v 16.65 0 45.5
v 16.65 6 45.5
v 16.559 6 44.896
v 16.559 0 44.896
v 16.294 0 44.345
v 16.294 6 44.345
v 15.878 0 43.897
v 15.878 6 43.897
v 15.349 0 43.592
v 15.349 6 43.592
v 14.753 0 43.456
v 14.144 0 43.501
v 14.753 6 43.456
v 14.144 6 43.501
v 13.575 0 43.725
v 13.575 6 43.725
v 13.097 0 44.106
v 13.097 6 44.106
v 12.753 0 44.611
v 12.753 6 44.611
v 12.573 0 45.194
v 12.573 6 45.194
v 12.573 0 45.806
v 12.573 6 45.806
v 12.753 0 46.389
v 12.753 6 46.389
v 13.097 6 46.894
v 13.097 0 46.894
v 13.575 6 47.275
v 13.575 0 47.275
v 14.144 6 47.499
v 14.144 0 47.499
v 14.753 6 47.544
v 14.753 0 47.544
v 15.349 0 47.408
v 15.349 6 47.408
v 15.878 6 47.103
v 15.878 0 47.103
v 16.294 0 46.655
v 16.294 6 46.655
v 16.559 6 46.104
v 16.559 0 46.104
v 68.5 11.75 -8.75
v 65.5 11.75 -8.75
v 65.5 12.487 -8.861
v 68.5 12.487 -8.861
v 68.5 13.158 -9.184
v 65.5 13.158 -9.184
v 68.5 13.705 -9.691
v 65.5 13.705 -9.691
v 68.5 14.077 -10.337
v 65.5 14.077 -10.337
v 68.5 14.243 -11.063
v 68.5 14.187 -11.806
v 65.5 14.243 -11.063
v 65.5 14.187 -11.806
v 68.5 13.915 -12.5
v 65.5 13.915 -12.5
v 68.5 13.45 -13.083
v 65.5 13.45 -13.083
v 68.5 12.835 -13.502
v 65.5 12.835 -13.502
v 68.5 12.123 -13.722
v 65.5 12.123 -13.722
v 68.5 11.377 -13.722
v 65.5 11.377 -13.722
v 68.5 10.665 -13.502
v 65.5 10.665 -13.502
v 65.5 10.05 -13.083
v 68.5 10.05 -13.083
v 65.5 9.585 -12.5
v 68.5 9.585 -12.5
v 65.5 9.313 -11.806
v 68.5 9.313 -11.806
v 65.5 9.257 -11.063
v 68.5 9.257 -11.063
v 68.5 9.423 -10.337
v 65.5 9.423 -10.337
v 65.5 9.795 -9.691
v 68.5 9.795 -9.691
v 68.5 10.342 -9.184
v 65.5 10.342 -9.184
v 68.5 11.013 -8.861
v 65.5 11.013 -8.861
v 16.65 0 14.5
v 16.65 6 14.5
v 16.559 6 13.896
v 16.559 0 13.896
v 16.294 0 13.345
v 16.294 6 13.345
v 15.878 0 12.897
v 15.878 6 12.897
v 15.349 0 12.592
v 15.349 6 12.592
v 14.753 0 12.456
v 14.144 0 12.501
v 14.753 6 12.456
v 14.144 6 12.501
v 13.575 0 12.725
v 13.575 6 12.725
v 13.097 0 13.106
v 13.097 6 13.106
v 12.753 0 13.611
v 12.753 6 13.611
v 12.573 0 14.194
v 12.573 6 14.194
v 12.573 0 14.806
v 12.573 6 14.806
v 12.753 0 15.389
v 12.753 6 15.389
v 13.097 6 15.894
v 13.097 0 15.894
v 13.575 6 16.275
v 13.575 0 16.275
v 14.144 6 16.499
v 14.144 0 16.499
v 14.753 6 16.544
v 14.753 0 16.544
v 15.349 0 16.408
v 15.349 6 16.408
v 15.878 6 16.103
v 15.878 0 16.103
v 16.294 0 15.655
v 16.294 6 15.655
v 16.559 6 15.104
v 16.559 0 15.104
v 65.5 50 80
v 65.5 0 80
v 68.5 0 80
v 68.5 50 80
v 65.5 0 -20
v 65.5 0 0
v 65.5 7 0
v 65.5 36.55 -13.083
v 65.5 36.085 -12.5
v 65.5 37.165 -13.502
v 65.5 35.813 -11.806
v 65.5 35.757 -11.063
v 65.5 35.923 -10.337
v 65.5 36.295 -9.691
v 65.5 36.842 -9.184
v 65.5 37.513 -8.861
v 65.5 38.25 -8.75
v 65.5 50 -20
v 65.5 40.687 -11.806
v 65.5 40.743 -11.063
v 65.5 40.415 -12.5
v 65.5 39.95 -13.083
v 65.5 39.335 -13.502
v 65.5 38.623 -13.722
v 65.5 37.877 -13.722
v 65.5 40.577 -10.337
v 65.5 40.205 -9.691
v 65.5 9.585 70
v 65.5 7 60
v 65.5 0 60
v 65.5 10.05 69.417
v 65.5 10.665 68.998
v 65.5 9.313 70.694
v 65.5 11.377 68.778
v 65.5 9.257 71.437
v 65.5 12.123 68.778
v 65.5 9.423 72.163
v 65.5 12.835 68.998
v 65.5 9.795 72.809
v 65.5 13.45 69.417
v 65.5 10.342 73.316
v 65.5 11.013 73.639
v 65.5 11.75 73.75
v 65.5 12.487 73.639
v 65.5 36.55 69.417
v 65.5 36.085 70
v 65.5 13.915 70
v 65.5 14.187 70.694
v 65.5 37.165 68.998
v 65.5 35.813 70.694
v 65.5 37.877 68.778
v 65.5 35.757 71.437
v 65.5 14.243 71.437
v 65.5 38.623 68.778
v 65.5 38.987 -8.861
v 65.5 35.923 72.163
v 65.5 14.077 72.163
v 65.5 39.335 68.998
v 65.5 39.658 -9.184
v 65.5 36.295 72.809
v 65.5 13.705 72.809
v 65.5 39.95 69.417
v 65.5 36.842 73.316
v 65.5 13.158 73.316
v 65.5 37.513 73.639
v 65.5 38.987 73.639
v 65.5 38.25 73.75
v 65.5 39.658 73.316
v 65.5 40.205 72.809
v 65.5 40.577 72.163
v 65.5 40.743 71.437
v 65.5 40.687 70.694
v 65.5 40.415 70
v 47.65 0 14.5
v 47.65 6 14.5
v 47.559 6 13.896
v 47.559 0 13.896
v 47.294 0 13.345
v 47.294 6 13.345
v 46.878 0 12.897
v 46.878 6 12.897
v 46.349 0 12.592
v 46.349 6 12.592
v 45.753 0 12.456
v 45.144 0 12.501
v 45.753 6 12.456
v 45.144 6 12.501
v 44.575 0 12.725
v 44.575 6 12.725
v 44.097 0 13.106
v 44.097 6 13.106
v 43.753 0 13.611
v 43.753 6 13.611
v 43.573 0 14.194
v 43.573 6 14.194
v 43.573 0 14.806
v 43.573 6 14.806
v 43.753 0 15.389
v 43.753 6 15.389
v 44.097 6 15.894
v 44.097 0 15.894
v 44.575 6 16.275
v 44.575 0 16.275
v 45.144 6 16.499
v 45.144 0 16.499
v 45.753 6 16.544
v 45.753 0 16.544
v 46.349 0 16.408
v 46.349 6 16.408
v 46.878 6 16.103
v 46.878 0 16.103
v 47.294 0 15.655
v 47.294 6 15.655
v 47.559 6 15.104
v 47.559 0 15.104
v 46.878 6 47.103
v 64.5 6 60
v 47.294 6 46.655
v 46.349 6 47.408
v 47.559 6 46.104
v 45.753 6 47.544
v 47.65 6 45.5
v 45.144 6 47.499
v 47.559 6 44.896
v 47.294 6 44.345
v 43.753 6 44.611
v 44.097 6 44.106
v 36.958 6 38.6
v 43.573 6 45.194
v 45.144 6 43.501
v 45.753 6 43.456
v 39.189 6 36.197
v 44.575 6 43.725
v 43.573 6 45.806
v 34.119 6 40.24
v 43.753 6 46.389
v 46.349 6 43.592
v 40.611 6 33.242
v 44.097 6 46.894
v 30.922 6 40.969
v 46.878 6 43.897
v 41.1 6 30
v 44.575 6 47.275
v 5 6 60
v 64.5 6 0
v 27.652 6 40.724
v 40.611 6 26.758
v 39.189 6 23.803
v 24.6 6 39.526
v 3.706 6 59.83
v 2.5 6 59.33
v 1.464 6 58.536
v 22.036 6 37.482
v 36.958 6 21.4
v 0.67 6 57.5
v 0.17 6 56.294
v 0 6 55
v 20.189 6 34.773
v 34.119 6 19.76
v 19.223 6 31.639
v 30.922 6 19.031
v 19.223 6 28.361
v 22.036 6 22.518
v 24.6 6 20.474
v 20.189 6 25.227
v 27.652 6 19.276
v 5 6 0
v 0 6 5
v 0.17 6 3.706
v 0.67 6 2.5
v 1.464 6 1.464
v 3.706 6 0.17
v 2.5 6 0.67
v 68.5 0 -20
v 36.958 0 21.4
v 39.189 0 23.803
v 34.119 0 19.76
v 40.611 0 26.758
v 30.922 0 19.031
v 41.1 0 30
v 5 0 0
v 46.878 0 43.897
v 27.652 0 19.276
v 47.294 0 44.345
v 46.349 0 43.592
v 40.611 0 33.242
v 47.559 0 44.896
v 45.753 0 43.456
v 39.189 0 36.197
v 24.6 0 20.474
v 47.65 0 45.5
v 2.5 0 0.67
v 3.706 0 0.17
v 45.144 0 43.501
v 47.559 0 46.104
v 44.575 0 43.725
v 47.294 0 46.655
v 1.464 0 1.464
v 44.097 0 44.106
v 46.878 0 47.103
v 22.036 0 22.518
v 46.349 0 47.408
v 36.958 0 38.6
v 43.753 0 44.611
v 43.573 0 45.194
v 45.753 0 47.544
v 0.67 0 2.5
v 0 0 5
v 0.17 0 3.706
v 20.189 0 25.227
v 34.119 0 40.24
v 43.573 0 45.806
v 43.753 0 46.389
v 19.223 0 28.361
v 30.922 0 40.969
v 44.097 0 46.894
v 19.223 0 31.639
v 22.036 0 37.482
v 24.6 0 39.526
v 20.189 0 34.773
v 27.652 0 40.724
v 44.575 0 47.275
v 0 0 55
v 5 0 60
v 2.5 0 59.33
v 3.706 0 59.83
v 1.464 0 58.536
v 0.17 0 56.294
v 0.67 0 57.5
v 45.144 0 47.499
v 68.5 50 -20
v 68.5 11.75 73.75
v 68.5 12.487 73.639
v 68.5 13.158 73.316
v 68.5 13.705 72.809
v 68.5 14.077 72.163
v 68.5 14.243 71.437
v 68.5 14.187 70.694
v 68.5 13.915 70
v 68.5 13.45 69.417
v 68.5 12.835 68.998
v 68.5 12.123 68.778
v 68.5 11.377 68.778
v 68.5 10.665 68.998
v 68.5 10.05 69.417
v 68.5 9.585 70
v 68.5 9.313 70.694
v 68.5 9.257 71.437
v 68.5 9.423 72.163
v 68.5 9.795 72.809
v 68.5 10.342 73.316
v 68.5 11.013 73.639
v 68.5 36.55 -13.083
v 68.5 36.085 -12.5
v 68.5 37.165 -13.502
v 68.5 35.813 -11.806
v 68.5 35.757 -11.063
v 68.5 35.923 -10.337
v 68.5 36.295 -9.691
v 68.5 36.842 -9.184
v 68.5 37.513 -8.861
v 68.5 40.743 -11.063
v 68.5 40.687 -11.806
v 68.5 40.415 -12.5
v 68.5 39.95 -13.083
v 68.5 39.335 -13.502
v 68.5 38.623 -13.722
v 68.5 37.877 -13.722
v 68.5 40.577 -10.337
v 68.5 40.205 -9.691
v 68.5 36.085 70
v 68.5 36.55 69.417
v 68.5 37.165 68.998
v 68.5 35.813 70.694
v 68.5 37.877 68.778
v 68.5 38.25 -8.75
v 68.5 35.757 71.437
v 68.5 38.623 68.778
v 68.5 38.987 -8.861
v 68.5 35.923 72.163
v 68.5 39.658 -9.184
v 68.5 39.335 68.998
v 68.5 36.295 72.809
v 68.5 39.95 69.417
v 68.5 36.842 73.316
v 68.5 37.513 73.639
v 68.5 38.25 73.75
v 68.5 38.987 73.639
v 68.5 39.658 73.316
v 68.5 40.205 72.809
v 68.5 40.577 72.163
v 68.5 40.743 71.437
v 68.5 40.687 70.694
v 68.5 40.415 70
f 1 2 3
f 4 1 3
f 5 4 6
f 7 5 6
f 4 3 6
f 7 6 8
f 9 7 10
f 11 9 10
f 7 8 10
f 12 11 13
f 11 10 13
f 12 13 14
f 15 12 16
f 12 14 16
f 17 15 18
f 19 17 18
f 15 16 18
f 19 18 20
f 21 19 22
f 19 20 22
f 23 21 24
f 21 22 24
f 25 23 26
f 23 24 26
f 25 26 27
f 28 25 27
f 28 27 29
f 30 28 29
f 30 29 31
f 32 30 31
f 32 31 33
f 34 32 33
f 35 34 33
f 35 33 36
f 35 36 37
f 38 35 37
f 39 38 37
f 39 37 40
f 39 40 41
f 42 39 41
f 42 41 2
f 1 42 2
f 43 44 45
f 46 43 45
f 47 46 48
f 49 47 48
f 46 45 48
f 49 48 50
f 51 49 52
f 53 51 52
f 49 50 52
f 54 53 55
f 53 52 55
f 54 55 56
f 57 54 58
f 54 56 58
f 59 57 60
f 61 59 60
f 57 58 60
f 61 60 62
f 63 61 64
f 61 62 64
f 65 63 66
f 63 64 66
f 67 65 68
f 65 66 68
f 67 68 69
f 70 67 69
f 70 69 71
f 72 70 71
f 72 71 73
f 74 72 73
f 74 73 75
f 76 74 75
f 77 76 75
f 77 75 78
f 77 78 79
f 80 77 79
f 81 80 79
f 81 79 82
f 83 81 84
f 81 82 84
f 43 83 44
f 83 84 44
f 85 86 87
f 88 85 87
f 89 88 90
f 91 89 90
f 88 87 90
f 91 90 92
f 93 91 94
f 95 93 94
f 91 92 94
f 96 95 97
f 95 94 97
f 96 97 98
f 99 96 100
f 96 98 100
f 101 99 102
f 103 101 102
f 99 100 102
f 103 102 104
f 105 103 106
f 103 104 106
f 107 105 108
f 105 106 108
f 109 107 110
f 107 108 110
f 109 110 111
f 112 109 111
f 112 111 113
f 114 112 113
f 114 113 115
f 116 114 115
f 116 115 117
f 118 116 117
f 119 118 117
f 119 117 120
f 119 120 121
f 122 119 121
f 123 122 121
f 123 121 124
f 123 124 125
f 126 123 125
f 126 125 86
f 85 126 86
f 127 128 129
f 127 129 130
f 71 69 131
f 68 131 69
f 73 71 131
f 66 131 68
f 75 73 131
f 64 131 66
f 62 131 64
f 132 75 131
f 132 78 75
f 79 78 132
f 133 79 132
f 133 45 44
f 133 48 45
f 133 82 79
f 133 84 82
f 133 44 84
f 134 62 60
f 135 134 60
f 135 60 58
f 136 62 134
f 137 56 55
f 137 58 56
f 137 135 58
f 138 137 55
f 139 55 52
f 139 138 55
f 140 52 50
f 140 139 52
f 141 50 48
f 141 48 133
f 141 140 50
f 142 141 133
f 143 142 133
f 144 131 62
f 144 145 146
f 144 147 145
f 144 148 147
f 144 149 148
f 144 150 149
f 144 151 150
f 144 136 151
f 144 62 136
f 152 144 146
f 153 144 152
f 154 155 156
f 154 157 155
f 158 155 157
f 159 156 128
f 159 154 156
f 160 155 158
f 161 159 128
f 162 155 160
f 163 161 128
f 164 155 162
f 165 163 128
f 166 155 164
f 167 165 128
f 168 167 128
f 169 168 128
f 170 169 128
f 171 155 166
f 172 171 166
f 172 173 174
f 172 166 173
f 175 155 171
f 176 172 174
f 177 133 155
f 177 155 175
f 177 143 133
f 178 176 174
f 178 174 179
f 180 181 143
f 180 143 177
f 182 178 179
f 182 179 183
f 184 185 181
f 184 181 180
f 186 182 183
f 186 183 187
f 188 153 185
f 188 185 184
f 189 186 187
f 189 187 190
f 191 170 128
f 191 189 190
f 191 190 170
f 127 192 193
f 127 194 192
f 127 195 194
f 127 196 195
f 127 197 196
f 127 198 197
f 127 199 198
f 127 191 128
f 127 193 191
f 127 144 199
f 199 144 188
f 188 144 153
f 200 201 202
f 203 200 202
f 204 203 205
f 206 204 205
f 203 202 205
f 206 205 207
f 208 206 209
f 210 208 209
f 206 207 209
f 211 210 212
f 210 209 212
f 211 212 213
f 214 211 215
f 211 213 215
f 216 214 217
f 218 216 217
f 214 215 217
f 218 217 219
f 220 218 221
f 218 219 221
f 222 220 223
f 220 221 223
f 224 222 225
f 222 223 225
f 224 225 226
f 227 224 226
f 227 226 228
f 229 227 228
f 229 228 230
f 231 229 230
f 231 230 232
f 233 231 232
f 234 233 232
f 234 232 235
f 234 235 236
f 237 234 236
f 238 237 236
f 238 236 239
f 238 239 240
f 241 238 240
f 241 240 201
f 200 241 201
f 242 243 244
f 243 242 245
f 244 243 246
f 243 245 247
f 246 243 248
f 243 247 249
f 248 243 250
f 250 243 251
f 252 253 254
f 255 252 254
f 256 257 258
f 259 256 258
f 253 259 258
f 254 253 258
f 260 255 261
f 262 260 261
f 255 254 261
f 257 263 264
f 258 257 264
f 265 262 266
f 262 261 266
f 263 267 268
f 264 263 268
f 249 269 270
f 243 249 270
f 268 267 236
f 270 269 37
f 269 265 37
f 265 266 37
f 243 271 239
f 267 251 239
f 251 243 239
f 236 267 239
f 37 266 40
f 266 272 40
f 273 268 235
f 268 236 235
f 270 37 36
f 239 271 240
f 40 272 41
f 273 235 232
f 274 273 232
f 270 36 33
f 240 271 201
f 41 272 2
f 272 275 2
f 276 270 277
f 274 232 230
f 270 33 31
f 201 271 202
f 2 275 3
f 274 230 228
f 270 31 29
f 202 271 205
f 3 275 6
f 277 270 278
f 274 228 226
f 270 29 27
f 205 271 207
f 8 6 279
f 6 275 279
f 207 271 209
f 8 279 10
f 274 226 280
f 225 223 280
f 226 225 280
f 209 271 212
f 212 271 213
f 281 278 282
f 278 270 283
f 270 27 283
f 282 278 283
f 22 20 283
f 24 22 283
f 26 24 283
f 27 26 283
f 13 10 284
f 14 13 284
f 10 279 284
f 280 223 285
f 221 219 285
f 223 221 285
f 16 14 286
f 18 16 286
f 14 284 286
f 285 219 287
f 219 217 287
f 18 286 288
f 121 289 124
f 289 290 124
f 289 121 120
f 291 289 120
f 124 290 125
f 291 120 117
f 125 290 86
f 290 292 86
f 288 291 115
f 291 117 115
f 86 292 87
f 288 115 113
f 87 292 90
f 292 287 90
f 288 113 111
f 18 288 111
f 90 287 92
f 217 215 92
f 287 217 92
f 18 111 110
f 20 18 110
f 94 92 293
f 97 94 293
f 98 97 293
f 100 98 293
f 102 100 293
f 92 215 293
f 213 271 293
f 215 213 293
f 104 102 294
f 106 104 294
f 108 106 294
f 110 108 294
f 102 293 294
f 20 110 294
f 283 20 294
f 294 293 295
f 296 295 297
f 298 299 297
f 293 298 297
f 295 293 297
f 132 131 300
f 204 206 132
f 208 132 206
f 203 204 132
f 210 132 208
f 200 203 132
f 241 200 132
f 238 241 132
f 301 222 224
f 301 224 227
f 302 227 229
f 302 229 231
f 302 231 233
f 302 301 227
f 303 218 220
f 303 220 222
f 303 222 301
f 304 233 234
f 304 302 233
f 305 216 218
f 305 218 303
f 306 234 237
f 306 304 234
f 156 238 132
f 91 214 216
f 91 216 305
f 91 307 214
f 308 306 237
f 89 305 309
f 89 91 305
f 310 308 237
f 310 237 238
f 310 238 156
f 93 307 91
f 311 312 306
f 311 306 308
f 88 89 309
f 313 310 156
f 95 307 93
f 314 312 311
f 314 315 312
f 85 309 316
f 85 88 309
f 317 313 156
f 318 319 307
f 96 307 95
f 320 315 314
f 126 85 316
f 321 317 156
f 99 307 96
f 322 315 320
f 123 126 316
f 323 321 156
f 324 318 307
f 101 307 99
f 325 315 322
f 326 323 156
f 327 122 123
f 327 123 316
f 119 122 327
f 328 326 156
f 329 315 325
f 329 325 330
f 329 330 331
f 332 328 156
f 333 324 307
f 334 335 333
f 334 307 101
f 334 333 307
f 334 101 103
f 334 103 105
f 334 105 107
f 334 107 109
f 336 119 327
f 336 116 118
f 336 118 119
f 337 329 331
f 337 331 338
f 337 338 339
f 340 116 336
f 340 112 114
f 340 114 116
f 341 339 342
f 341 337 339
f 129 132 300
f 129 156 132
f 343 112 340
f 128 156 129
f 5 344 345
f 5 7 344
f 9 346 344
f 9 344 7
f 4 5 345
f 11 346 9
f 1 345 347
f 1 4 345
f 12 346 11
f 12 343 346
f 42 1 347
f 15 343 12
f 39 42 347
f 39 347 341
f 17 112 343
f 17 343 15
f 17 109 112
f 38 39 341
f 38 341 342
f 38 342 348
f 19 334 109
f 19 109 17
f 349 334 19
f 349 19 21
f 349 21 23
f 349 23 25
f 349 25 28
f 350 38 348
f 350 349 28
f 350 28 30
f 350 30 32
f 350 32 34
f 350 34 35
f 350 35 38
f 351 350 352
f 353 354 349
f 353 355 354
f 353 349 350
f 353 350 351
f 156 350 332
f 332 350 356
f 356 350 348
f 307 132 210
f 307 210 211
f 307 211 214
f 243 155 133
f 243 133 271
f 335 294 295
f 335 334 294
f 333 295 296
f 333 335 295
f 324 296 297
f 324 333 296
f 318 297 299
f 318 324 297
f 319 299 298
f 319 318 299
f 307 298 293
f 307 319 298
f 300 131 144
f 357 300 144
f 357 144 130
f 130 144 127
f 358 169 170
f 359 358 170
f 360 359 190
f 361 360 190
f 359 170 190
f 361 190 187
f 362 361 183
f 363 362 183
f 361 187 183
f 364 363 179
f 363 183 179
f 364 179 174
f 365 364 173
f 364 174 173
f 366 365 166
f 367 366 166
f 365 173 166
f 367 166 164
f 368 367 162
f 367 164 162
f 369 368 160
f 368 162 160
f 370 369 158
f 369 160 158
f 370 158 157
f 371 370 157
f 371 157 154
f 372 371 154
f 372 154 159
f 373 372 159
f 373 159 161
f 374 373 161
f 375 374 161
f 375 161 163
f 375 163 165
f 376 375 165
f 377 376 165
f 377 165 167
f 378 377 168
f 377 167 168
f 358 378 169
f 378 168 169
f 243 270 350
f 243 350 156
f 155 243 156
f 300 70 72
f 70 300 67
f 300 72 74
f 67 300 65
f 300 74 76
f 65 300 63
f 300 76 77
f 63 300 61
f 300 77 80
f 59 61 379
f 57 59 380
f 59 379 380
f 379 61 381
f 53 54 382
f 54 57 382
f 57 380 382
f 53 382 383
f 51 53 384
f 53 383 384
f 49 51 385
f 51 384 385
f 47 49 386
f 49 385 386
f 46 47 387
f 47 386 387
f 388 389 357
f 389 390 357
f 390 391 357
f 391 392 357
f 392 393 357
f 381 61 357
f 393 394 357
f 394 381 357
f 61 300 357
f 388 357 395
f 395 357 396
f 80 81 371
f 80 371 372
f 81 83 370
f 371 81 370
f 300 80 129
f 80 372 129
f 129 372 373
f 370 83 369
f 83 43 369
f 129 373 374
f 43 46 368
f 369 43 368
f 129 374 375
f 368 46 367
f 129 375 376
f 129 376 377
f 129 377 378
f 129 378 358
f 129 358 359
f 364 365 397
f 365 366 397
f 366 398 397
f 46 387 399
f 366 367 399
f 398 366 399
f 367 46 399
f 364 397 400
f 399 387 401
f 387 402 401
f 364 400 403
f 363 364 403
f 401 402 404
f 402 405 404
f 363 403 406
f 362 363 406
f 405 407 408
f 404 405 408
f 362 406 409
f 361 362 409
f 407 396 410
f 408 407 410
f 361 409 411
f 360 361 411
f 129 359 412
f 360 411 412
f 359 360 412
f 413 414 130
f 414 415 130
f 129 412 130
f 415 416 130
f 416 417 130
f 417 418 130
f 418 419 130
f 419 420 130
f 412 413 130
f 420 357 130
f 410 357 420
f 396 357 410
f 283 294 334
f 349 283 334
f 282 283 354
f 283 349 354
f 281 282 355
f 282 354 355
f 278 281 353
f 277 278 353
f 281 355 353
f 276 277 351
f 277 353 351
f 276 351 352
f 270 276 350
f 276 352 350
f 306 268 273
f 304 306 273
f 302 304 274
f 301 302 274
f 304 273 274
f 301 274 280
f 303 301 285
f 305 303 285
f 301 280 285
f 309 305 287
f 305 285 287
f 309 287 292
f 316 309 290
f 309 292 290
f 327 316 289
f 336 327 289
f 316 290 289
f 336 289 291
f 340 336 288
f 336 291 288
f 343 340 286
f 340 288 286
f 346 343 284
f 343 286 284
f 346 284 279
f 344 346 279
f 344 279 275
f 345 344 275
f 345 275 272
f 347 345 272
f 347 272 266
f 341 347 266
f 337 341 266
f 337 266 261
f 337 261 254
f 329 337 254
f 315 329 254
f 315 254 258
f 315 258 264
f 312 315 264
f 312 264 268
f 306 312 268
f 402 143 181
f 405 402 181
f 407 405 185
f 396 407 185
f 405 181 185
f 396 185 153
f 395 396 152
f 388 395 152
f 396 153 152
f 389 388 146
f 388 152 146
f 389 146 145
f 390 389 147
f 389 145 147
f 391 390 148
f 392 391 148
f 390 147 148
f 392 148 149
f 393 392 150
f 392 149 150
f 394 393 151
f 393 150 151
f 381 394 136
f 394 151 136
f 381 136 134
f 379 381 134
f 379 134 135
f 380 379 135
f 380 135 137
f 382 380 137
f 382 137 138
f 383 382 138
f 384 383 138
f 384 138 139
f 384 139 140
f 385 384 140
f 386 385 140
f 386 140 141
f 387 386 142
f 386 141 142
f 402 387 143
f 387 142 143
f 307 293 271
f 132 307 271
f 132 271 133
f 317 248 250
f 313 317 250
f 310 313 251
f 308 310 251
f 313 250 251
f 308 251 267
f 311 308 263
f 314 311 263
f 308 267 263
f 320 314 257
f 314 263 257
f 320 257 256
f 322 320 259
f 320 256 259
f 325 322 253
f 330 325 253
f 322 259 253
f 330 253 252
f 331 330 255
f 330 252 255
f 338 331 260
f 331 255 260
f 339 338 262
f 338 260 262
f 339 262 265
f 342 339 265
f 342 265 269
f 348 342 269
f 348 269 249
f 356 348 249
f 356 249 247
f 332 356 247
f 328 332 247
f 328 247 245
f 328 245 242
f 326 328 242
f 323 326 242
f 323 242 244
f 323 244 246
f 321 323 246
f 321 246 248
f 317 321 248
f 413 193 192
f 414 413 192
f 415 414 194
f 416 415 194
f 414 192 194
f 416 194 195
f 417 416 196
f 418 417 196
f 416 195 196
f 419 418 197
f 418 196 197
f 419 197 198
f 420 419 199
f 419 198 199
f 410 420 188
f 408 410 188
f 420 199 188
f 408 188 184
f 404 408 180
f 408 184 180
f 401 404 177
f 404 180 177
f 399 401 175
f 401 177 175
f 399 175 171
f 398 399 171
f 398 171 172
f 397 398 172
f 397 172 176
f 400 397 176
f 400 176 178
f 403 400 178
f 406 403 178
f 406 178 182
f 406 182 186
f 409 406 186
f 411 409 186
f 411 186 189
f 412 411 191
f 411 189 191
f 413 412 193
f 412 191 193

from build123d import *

# Parameters (mm, degrees)
EXTRUDE_1_DEPTH     = 60
SKETCH_4_R          = 11
SKETCH_4_R_2        = 2.05
CUT_EXTRUDE_3_DEPTH = 7
FILLET_2_R          = 5
SKETCH_5_W          = 100
SKETCH_5_H          = 50
SKETCH_5_R          = 2.5
EXTRUDE_2_DEPTH     = 3


with BuildPart() as part:
    # 草图1 → 凸台-拉伸1 (new body)
    with BuildSketch(Plane.XY):
        Polygon((0, 0), (68.5, 0), (68.5, 50), (65.5, 50), (65.5, 7), (64.5, 6), (0, 6), align=None)
    extrude(amount=EXTRUDE_1_DEPTH)

    # 草图4 → 切除-拉伸3 (cut, through all)
    with BuildSketch(Plane(origin=(0, 6, 0), x_dir=(1, 0, 0), z_dir=(0, 1, 0))):
        with Locations((30.1, -30)):
            Circle(SKETCH_4_R)
        with Locations((14.6, -14.5)):
            Circle(SKETCH_4_R_2)
        with Locations((45.6, -14.5)):
            Circle(SKETCH_4_R_2)
        with Locations((45.6, -45.5)):
            Circle(SKETCH_4_R_2)
        with Locations((14.6, -45.5)):
            Circle(SKETCH_4_R_2)
    extrude(amount=-CUT_EXTRUDE_3_DEPTH, mode=Mode.SUBTRACT)

    # 圆角2
    fillet_2_edges = [part.edges().sort_by_distance(p)[0] for p in [
        (0, 3, 0),
        (0, 3, 60),
    ]]
    fillet(fillet_2_edges, radius=FILLET_2_R)

    # 草图5 → 凸台-拉伸2 (add)
    with BuildSketch(Plane.ZY.offset(-65.5)):
        with Locations((30, 25)):
            Rectangle(SKETCH_5_W, SKETCH_5_H)
        with Locations((71.25, 11.75)):
            Circle(SKETCH_5_R, mode=Mode.SUBTRACT)
        with Locations((-11.25, 11.75)):
            Circle(SKETCH_5_R, mode=Mode.SUBTRACT)
        with Locations((-11.25, 38.25)):
            Circle(SKETCH_5_R, mode=Mode.SUBTRACT)
        with Locations((71.25, 38.25)):
            Circle(SKETCH_5_R, mode=Mode.SUBTRACT)
    extrude(amount=-EXTRUDE_2_DEPTH)


solid = part.part
